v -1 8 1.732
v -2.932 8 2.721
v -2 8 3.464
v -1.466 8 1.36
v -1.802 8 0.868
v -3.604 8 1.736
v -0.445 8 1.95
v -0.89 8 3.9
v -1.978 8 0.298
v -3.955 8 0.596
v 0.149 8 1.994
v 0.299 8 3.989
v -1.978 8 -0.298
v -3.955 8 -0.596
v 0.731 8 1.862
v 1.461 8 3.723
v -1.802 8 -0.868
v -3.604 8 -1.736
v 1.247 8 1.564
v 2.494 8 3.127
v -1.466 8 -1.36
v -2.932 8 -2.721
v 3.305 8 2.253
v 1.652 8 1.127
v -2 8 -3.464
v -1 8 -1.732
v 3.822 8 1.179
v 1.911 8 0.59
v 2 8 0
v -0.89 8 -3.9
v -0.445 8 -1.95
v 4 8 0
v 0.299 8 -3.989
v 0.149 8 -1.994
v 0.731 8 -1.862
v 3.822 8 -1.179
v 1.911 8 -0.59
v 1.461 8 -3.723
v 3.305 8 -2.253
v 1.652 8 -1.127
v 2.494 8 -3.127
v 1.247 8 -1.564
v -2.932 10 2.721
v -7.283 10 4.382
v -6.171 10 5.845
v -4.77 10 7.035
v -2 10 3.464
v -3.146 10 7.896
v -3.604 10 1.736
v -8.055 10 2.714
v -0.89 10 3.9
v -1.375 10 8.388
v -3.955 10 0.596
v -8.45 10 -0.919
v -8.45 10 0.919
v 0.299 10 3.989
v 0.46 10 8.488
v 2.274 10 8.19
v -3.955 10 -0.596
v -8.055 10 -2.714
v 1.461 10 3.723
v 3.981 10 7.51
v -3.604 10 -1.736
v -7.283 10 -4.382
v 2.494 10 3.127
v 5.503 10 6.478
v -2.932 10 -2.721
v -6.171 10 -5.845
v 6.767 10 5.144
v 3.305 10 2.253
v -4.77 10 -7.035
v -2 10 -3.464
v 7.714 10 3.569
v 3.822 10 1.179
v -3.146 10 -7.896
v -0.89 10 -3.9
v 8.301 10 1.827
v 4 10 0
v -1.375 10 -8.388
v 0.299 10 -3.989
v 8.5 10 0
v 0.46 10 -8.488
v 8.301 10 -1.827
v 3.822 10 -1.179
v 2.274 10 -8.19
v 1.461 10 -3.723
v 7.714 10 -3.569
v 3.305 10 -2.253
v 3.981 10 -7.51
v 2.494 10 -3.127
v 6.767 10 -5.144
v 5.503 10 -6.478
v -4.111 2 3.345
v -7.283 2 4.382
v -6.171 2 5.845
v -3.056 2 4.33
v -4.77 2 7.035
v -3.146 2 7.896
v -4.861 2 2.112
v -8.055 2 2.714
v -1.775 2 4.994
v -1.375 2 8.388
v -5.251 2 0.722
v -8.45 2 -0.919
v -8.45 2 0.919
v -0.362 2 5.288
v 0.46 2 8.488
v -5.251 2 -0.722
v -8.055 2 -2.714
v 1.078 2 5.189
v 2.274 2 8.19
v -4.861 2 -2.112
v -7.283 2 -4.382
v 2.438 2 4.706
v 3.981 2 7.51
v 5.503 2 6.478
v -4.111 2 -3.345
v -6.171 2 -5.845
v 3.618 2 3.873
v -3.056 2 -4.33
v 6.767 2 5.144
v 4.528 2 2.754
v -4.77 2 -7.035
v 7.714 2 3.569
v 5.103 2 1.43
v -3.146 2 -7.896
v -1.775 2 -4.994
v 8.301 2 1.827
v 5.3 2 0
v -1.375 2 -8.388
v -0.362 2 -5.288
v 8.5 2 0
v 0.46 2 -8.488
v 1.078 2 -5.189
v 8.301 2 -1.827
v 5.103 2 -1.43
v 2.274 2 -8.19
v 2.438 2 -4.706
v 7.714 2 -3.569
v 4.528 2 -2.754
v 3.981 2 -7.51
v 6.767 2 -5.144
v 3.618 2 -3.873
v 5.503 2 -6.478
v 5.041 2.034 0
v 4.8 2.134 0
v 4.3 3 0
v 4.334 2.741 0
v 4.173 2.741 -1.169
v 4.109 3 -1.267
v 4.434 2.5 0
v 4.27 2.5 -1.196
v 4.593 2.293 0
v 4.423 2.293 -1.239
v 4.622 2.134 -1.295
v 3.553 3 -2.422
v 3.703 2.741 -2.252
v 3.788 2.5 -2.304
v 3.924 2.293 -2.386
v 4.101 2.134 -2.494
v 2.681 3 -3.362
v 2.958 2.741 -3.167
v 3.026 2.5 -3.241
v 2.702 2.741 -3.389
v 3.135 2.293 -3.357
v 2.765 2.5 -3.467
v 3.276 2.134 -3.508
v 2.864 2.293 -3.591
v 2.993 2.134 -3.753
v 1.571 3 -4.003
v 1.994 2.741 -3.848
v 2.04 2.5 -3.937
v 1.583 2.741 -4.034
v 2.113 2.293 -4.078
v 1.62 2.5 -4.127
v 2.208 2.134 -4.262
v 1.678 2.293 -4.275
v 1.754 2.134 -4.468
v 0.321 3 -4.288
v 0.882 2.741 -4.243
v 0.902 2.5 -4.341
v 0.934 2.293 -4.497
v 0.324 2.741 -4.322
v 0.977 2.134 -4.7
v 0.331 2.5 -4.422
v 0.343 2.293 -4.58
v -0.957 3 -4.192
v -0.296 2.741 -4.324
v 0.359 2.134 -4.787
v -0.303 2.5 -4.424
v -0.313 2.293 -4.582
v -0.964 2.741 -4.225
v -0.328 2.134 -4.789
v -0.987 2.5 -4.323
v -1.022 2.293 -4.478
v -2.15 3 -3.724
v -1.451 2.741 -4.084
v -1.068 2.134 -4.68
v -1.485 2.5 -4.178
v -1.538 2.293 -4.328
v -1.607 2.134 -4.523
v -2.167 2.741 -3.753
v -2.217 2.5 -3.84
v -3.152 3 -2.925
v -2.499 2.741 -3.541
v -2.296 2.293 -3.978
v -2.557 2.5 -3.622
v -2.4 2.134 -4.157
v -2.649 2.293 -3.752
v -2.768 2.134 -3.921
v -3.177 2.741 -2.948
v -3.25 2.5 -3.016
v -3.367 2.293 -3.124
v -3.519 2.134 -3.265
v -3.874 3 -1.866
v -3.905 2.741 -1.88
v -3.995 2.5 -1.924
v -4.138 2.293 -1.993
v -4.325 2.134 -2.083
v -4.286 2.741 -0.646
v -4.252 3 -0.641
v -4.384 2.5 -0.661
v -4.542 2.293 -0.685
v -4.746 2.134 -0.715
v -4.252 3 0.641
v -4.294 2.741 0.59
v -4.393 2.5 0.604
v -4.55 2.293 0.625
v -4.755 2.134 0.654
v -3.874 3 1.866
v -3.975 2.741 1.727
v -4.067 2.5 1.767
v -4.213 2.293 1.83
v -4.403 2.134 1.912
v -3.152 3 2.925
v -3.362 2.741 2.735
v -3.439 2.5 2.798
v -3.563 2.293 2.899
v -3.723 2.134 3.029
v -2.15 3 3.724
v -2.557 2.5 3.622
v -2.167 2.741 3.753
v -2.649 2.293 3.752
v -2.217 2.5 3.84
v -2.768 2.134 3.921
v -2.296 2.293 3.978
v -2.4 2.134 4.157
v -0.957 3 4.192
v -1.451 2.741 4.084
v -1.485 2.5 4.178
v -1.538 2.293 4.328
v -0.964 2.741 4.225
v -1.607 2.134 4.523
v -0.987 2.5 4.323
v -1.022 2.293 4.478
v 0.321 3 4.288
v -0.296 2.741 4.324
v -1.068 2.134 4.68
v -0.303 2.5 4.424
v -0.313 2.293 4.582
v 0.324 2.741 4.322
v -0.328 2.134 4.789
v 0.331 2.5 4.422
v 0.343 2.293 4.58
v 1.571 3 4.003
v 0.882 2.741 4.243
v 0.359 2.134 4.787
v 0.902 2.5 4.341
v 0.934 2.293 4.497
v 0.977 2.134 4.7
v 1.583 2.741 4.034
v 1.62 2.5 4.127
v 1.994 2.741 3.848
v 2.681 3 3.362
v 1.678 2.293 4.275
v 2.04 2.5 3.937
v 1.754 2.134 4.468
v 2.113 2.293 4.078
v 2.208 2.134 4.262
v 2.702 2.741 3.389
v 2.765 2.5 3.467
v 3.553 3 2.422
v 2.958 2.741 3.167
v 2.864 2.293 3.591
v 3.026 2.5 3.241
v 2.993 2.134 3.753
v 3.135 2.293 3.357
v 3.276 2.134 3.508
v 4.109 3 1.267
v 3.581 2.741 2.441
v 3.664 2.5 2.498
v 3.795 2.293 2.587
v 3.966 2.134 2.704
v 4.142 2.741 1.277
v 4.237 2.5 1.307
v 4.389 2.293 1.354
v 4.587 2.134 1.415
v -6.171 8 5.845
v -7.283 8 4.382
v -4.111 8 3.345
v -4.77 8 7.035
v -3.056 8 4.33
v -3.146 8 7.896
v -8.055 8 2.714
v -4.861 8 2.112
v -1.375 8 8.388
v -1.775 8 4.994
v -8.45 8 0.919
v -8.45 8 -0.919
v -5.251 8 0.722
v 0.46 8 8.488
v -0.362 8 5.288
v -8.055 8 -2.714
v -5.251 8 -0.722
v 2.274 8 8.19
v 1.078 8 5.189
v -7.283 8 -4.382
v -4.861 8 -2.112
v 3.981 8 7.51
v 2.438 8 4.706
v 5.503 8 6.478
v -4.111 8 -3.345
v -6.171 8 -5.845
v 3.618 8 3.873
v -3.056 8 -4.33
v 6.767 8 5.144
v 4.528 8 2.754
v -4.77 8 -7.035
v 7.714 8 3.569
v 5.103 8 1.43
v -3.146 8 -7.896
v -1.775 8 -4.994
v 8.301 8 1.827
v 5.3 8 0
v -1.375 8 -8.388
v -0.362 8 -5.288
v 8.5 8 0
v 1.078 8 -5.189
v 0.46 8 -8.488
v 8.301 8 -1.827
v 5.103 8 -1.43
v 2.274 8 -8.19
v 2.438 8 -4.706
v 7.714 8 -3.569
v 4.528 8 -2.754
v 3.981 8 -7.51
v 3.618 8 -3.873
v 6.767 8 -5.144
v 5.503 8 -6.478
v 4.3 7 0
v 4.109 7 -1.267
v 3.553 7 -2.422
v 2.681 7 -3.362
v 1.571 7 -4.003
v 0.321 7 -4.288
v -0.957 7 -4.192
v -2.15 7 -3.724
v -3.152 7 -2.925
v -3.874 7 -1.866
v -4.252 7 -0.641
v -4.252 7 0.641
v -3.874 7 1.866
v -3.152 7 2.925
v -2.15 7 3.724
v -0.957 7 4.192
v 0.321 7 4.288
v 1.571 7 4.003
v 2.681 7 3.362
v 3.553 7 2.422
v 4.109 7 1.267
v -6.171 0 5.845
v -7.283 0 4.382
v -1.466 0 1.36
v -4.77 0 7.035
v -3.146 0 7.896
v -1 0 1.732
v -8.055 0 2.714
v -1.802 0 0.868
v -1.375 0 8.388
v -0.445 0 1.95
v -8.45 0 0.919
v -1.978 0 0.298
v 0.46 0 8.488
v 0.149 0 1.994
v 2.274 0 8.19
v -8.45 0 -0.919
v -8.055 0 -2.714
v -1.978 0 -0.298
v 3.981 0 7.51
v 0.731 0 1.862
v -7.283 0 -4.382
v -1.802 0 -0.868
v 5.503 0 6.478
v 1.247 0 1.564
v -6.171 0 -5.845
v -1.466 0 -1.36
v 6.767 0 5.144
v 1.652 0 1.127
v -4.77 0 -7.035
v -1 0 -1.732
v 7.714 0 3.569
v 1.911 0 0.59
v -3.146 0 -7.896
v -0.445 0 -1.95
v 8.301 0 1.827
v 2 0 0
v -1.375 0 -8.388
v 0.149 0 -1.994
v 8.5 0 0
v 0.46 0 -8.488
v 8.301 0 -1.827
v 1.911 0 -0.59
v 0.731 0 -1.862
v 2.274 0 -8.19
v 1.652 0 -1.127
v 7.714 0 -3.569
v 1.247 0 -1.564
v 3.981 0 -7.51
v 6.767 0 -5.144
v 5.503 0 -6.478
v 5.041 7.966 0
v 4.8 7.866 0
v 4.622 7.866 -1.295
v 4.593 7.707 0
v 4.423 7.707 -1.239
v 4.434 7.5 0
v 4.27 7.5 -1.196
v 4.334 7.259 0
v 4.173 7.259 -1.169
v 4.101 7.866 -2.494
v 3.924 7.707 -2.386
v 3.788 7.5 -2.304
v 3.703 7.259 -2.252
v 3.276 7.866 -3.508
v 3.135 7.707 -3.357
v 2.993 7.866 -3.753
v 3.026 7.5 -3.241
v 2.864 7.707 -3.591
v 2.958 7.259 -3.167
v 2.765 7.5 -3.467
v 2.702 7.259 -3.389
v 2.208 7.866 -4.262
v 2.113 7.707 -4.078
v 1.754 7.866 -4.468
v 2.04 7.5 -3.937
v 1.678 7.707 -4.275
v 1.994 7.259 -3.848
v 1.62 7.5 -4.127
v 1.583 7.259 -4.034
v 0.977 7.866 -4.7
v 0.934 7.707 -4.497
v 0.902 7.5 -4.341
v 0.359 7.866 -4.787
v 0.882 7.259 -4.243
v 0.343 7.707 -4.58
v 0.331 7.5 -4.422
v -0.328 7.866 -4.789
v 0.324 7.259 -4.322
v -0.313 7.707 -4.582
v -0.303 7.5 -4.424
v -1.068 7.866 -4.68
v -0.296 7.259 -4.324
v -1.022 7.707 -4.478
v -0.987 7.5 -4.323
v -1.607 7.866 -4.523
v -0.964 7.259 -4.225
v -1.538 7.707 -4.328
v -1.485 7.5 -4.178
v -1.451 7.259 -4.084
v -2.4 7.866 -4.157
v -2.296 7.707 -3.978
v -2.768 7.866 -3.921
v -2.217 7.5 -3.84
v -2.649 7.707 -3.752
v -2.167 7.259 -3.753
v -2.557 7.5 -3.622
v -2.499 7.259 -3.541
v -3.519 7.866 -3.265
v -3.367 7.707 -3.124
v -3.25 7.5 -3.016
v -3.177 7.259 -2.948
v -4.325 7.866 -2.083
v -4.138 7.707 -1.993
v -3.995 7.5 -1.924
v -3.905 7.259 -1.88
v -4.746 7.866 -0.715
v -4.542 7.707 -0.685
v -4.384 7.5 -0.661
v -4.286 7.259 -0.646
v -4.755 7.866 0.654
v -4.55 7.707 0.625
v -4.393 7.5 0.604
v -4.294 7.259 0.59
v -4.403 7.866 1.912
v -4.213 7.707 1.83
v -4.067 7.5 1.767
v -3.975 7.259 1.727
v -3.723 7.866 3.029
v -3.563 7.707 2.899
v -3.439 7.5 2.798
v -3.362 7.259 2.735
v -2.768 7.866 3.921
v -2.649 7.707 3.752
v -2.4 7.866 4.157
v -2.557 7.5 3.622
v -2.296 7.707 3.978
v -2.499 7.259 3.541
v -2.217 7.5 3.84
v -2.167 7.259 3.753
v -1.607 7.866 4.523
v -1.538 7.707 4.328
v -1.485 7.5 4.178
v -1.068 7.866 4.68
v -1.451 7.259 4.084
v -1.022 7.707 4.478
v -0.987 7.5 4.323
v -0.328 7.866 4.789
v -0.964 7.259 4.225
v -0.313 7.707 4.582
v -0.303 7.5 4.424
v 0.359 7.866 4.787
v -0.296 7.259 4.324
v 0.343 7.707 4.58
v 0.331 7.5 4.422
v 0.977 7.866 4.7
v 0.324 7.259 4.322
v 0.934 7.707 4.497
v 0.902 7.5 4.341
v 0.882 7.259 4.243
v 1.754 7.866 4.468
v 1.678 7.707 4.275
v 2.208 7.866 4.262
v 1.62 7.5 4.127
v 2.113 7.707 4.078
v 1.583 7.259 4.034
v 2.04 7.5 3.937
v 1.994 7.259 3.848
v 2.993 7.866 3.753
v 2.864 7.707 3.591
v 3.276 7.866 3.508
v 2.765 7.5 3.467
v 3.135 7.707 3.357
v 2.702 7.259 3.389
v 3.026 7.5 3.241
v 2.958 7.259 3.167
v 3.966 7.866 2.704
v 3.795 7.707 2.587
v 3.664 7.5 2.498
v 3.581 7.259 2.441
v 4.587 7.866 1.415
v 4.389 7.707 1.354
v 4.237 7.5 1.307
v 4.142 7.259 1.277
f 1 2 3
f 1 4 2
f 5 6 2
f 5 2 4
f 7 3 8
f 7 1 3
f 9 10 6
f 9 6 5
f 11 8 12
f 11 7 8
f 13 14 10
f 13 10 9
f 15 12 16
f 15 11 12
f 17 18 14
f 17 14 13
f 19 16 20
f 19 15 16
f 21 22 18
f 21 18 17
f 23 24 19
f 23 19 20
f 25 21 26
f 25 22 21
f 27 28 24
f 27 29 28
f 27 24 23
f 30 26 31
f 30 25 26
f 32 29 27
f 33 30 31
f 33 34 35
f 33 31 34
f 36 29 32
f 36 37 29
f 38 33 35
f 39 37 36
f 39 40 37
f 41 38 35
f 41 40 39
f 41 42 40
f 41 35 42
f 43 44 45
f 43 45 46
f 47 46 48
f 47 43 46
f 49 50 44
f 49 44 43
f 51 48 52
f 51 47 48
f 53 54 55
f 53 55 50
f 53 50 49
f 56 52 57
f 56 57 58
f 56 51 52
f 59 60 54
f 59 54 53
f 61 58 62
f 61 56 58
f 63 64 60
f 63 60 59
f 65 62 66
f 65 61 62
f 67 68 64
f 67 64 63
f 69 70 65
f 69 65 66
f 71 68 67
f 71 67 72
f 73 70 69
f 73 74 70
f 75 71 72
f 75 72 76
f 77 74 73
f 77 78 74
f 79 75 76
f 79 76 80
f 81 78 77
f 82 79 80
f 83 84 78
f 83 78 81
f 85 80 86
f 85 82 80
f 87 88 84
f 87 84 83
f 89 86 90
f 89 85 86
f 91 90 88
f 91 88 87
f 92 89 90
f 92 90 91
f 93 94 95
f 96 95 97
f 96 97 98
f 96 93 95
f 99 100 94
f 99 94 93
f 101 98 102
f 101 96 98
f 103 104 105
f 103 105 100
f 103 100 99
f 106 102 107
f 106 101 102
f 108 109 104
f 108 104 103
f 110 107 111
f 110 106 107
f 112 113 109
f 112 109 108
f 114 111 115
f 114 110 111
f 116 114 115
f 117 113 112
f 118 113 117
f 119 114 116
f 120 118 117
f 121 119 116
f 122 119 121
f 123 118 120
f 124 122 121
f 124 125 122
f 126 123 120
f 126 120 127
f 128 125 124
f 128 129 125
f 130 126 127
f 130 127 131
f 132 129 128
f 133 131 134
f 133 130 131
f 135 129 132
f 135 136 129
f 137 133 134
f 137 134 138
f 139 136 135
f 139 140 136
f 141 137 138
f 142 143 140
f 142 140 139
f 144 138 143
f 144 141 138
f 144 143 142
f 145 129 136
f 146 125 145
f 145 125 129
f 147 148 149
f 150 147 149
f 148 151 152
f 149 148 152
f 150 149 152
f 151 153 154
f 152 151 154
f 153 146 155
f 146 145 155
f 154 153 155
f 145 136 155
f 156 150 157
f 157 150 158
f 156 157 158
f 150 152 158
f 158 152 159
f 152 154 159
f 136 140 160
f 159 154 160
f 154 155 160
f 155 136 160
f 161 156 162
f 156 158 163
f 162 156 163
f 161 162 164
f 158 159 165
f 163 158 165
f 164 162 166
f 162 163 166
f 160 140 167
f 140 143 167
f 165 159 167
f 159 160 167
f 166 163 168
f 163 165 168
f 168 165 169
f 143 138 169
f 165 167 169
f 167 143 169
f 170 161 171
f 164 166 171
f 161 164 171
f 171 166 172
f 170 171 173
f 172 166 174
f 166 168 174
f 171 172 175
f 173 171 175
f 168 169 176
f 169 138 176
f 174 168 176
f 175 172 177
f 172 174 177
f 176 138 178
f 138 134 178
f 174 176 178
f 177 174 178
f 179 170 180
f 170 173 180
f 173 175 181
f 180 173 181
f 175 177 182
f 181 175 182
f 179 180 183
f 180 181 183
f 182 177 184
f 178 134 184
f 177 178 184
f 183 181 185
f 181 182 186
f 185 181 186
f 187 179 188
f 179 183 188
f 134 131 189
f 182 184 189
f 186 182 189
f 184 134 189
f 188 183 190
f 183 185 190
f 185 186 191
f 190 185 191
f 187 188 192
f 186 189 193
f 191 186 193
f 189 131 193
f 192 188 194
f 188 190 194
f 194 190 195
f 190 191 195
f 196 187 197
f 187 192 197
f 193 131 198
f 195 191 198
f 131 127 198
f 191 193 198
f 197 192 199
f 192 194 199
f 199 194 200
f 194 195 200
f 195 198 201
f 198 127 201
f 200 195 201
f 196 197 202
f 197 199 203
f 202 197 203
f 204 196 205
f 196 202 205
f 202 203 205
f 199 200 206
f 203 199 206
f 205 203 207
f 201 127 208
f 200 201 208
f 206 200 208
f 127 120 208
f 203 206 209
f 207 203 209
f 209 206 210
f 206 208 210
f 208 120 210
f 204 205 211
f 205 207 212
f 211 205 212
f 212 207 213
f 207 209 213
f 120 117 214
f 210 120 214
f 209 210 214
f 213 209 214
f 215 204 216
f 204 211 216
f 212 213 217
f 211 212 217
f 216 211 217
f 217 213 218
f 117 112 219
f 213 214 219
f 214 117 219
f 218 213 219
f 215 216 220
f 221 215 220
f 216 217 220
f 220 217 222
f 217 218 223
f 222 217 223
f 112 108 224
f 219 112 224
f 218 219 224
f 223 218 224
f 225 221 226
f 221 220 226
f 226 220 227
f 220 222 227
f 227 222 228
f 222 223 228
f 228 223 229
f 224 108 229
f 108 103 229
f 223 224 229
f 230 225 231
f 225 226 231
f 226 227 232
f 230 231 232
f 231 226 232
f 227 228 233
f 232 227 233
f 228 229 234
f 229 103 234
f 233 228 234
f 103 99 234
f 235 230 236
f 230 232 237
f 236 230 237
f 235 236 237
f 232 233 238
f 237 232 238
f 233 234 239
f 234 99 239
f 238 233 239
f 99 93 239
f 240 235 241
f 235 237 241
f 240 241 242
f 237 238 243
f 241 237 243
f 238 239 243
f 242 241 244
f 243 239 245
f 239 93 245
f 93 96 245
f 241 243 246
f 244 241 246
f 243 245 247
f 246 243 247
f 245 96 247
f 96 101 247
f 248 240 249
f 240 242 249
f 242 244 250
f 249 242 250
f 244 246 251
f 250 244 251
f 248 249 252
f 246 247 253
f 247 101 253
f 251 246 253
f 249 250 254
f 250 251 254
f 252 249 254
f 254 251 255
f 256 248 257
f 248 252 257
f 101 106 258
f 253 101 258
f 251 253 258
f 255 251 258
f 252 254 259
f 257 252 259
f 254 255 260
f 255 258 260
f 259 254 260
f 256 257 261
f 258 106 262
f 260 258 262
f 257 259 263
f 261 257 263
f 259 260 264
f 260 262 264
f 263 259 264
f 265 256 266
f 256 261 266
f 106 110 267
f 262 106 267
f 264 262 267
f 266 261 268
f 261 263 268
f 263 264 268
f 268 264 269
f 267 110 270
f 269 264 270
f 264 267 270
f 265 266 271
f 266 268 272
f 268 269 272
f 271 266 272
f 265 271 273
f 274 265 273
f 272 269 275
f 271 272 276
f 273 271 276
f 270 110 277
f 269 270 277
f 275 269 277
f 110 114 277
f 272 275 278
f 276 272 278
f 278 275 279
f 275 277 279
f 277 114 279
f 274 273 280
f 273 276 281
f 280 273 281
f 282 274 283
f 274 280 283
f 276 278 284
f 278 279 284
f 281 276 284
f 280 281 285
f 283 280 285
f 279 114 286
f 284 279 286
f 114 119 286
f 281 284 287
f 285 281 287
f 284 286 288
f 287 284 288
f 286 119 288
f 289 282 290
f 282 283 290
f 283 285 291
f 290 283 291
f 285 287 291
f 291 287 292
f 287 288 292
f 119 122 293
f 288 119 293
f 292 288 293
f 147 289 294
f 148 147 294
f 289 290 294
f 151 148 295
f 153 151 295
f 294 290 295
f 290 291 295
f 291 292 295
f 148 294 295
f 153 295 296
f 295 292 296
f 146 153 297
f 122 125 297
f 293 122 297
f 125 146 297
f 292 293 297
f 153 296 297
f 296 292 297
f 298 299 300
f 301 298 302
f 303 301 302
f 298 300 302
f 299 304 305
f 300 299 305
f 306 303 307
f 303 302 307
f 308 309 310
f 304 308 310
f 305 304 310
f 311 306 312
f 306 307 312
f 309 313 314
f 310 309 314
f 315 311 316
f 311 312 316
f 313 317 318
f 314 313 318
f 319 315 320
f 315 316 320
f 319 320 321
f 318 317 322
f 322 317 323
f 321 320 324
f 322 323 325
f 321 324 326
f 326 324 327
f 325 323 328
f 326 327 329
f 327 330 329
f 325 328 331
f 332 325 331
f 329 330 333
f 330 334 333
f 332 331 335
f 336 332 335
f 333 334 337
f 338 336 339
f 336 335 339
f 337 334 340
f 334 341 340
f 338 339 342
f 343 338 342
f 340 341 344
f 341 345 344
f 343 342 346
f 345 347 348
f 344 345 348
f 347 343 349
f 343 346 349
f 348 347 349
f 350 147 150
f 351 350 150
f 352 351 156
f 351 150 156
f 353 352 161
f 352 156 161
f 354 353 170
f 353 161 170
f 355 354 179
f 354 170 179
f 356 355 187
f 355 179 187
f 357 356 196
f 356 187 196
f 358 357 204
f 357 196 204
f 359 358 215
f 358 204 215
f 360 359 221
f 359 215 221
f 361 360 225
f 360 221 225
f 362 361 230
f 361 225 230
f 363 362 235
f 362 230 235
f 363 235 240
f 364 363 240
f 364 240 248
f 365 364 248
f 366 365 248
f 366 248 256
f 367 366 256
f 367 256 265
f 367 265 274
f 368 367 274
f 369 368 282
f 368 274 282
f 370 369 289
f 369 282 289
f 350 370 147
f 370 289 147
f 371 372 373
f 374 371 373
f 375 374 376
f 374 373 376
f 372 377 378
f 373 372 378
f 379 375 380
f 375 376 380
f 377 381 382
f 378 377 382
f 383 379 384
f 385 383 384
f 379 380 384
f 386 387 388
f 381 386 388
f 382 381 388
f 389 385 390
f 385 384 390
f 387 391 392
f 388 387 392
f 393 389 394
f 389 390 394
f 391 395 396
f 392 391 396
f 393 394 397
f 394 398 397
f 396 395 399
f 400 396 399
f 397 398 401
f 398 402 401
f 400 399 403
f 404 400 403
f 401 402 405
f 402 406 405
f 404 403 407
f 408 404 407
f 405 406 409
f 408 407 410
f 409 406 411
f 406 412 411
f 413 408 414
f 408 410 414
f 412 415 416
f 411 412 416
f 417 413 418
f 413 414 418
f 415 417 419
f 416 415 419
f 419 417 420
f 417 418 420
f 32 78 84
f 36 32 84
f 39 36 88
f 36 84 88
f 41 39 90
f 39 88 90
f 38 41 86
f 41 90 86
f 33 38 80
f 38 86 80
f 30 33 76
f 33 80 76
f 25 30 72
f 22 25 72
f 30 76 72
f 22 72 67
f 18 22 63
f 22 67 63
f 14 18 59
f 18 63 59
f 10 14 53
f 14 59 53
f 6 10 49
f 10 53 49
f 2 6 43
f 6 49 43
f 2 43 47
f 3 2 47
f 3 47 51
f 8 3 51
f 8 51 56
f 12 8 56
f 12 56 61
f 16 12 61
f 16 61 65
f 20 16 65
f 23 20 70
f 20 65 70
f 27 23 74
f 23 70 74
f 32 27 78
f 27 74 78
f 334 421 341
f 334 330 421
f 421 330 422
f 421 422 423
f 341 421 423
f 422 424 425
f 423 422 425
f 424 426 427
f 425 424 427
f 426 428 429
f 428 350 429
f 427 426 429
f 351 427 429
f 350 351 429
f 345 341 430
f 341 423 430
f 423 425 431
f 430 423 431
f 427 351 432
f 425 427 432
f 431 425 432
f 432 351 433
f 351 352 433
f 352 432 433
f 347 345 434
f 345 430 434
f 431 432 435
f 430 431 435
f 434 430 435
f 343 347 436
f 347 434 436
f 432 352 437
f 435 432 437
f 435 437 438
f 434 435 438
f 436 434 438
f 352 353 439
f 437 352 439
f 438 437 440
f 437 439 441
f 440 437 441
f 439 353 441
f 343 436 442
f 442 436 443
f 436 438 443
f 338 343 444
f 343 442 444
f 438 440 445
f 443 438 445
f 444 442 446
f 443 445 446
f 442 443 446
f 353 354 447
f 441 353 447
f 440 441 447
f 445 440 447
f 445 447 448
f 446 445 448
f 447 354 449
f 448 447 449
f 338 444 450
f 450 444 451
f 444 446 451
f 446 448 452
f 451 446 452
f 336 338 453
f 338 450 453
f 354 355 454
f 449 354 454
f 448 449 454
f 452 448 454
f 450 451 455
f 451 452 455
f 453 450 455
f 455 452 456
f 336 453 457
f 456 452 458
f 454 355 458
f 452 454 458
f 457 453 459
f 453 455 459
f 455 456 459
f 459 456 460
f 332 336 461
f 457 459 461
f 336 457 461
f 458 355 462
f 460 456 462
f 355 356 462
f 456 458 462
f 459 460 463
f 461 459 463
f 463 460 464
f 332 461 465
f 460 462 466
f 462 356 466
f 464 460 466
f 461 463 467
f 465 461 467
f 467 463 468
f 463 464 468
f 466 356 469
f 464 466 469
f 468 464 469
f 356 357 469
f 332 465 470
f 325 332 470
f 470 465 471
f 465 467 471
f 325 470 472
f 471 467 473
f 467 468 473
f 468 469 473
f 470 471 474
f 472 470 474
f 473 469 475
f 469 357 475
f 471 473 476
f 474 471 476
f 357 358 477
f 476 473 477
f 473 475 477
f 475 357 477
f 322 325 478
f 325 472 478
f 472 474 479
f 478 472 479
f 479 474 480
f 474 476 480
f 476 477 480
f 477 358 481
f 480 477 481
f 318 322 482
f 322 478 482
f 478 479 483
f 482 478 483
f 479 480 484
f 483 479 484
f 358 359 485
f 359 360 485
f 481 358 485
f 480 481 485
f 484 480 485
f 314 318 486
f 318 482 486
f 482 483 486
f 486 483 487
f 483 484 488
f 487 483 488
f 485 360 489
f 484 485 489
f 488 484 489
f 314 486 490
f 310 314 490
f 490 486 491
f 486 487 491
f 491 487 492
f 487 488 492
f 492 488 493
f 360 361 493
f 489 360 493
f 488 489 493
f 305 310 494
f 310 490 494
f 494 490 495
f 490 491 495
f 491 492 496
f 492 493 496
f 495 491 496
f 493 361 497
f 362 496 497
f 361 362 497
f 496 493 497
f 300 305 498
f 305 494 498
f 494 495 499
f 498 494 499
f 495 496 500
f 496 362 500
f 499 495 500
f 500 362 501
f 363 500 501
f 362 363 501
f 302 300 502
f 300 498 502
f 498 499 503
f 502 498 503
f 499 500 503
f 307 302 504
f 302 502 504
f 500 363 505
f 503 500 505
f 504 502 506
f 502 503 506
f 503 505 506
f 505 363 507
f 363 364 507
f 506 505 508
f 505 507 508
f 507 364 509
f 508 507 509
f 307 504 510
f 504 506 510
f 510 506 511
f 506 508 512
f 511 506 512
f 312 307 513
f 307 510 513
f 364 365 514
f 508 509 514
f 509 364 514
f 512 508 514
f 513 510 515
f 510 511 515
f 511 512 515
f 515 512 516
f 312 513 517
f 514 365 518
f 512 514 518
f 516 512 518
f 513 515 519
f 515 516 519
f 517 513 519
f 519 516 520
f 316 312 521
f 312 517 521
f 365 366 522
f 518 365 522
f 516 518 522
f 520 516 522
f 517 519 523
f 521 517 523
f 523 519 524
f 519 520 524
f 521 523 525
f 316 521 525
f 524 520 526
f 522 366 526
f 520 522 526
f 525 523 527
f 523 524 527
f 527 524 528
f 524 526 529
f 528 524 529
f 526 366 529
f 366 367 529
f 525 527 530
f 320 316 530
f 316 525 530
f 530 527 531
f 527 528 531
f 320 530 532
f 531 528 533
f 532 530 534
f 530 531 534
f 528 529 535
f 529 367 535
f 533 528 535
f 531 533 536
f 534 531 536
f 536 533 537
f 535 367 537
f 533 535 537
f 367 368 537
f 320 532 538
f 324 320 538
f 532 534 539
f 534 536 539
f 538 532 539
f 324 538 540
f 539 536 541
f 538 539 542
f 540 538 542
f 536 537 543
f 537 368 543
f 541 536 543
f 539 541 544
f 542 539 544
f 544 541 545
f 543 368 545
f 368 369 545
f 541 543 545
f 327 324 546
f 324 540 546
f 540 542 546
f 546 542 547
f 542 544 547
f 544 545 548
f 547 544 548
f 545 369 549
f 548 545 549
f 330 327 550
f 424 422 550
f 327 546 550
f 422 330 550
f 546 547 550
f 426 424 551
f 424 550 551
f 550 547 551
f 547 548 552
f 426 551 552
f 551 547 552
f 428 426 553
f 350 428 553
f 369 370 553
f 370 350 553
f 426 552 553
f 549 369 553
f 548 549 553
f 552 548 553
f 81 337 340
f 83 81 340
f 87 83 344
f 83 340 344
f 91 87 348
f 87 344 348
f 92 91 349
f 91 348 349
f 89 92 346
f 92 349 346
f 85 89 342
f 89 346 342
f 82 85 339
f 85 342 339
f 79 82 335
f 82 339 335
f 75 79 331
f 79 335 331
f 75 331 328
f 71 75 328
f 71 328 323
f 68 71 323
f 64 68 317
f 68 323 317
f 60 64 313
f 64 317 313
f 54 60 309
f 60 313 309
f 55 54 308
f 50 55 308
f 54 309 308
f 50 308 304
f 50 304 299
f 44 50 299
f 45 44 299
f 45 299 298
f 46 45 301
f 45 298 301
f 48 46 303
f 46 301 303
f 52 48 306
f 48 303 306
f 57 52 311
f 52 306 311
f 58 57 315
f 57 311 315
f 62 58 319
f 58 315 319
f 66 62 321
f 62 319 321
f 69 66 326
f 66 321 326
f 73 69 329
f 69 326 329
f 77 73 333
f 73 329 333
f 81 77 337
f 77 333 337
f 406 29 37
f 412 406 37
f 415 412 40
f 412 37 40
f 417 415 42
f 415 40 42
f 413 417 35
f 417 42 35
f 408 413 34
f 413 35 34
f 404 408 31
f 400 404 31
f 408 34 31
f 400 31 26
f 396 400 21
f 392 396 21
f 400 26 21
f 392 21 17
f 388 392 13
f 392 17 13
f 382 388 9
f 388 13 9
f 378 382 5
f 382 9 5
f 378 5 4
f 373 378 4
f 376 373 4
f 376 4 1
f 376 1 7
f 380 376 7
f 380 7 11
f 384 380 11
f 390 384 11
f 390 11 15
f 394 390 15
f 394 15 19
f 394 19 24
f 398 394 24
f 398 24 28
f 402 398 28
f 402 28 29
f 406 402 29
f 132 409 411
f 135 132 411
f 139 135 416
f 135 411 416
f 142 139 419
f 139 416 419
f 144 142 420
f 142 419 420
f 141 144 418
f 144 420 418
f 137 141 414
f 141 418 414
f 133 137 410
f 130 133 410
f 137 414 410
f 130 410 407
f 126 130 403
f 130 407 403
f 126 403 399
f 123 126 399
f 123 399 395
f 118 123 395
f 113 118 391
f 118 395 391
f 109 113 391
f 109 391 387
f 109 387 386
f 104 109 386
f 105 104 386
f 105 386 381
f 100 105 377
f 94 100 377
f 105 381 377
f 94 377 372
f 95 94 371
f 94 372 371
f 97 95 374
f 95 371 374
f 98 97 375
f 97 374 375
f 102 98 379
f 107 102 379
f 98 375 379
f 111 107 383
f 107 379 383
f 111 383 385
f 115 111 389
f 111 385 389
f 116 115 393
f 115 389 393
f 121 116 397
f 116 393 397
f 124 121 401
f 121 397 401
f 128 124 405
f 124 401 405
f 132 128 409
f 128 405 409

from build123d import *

# Parameters (mm, degrees)
SKETCH1_R           = 8.5
BOSS_EXTRUDE1_DEPTH = 2
SKETCH2_R           = 4.3
BOSS_EXTRUDE2_DEPTH = 6
SKETCH3_R           = 8.5
BOSS_EXTRUDE3_DEPTH = 2
SKETCH4_R           = 4
CUT_EXTRUDE1_DEPTH  = 2
SKETCH5_R           = 2
CUT_EXTRUDE2_DEPTH  = 11
FILLET1_R           = 1


with BuildPart() as part:
    # Sketch1 → Boss-Extrude1 (new body)
    with BuildSketch(Plane(origin=(0, 0, 0), x_dir=(1, 0, 0), z_dir=(0, 1, 0))):
        Circle(SKETCH1_R)
    extrude(amount=BOSS_EXTRUDE1_DEPTH)

    # Sketch2 → Boss-Extrude2 (add)
    with BuildSketch(Plane(origin=(0, 2, 0), x_dir=(1, 0, 0), z_dir=(0, 1, 0))):
        Circle(SKETCH2_R)
    extrude(amount=BOSS_EXTRUDE2_DEPTH)

    # Sketch3 → Boss-Extrude3 (add)
    with BuildSketch(Plane(origin=(0, 8, 0), x_dir=(1, 0, 0), z_dir=(0, 1, 0))):
        Circle(SKETCH3_R)
    extrude(amount=BOSS_EXTRUDE3_DEPTH)

    # Sketch4 → Cut-Extrude1 (cut)
    with BuildSketch(Plane(origin=(0, 10, 0), x_dir=(1, 0, 0), z_dir=(0, 1, 0))):
        Circle(SKETCH4_R)
    extrude(amount=-CUT_EXTRUDE1_DEPTH, mode=Mode.SUBTRACT)

    # Sketch5 → Cut-Extrude2 (cut)
    with BuildSketch(Plane(origin=(0, 8, 0), x_dir=(1, 0, 0), z_dir=(0, 1, 0))):
        Circle(SKETCH5_R)
    extrude(amount=-CUT_EXTRUDE2_DEPTH, mode=Mode.SUBTRACT)

    # Fillet1
    fillet1_edges = [part.edges().sort_by_distance(p)[0] for p in [
        (-4.3, 2, 0),
        (-4.3, 8, 0),
    ]]
    fillet(fillet1_edges, radius=FILLET1_R)


solid = part.part
